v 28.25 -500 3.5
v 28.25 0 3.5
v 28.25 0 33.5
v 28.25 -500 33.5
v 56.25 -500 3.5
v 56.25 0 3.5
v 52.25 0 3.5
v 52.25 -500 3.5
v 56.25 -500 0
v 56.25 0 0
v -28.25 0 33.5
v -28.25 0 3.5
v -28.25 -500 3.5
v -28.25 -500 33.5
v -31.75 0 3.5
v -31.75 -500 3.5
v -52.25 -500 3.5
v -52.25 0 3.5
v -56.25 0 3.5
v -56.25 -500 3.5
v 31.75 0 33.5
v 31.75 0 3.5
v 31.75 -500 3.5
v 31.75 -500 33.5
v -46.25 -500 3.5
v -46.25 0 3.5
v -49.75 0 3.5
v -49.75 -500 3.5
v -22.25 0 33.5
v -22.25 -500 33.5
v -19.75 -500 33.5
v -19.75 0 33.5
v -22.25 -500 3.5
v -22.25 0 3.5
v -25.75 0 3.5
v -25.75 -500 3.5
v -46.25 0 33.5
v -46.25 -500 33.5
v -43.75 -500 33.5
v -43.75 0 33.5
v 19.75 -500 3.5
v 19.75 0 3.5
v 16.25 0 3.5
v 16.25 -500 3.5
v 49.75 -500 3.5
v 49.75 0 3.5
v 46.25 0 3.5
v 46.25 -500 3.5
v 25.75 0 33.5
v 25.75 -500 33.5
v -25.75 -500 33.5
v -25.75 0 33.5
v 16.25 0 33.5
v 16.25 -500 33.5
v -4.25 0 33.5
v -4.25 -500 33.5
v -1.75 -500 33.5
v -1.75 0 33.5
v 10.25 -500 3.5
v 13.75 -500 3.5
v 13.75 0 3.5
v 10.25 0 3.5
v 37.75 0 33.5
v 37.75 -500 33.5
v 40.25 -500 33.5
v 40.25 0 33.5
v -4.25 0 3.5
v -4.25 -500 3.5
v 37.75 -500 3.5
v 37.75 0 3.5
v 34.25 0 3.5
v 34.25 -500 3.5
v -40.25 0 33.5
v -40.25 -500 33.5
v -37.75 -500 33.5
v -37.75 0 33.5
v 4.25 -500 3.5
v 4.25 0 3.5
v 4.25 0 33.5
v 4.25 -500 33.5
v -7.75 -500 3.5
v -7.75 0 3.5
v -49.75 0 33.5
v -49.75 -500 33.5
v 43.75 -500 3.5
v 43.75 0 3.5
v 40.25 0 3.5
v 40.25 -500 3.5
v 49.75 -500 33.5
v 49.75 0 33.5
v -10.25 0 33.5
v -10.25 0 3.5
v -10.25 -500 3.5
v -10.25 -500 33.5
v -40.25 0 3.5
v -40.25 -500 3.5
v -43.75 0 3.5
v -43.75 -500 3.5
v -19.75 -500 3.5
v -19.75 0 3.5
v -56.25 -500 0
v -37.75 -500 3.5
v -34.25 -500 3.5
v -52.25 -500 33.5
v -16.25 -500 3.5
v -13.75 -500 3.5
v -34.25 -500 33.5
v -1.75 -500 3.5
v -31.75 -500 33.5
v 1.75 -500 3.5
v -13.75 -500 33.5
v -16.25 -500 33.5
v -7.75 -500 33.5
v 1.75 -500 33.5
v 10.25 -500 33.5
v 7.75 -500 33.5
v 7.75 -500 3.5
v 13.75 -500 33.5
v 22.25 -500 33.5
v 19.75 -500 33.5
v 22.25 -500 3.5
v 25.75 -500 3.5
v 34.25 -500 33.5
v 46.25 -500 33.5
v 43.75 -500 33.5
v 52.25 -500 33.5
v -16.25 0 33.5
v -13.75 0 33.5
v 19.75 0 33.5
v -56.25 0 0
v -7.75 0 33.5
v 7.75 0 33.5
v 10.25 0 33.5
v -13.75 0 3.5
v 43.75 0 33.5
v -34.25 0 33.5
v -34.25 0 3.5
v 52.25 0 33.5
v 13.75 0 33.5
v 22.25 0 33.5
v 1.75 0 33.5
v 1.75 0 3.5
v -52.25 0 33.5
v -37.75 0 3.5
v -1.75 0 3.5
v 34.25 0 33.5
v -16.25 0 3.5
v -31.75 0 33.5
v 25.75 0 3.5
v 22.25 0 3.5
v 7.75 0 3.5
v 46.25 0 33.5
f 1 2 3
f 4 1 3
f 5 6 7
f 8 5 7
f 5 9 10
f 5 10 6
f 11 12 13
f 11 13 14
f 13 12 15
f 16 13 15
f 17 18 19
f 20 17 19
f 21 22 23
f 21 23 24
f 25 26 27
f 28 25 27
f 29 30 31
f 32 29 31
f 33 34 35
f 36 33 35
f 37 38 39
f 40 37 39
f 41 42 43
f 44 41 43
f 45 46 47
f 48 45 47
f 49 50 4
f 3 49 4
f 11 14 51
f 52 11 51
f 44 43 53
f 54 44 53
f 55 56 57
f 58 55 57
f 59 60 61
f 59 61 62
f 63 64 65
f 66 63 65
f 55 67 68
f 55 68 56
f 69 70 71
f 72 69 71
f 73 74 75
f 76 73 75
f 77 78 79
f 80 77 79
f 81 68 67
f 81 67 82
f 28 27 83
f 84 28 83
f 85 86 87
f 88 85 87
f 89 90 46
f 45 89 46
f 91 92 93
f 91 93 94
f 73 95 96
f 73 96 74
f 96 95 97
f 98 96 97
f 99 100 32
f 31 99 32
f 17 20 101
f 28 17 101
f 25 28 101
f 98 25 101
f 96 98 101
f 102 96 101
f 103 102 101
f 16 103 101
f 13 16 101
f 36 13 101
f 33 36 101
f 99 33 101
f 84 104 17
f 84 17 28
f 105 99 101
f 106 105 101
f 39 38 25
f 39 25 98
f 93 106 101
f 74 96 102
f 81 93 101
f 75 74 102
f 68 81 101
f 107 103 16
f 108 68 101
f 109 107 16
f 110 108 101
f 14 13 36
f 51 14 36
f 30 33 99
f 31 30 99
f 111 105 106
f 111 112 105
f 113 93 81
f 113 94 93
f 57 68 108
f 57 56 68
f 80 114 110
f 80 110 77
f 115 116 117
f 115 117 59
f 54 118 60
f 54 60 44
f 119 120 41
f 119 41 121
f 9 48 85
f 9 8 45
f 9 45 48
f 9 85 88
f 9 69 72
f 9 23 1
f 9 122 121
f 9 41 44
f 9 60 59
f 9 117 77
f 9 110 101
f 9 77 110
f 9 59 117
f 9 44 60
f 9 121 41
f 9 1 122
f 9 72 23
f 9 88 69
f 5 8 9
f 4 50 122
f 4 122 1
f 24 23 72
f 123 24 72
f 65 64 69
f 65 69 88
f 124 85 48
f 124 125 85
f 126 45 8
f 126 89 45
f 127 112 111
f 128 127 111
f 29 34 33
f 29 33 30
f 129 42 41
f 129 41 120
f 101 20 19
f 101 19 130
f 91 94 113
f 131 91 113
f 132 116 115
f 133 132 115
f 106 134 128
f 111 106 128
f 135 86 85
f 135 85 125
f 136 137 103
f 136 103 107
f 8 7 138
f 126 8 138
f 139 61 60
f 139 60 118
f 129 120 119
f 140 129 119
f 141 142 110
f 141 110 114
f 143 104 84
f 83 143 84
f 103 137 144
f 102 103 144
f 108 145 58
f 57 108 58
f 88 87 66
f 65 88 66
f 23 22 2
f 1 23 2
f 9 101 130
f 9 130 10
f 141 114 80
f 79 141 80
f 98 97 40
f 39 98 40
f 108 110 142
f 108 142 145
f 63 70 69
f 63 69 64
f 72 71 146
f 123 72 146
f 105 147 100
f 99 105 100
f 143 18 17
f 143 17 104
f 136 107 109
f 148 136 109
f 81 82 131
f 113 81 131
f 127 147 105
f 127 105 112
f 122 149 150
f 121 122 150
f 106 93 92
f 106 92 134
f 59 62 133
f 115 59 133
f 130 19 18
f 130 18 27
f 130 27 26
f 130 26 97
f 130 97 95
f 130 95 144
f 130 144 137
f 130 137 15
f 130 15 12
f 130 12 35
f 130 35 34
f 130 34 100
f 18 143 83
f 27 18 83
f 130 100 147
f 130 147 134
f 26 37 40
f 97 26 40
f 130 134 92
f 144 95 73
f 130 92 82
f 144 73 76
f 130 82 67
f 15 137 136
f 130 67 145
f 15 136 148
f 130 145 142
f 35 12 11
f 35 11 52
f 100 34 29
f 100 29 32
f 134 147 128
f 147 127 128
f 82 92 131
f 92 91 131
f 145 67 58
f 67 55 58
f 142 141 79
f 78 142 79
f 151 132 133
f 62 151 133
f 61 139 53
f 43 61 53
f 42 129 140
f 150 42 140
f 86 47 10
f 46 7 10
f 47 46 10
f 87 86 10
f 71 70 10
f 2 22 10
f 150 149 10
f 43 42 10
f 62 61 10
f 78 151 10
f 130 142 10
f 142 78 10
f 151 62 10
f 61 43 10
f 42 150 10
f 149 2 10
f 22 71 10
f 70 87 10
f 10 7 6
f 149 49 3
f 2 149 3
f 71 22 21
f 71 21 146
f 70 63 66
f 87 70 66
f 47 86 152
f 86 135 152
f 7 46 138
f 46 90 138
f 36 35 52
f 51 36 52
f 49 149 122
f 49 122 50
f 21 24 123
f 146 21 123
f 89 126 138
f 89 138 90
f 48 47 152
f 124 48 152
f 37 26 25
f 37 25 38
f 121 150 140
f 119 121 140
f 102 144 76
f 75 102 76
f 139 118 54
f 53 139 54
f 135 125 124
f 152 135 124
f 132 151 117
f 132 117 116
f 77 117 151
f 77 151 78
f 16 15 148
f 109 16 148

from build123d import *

# Parameters (mm, degrees)
F0_W     = 2.5
F0_H     = 30
F1_DEPTH = 500


with BuildPart() as f1:
    # F0 (on Front) → F1 (new body)
    with BuildSketch(Plane.XZ):
        Polygon((-56.25, 0), (0, 0), (56.25, 0), (56.25, 3.5), (52.25, 3.5), (52.25, 33.5), (49.75, 33.5), (49.75, 3.5), (46.25, 3.5), (43.75, 3.5), (40.25, 3.5), (37.75, 3.5), (34.25, 3.5), (31.75, 3.5), (28.25, 3.5), (25.75, 3.5), (22.25, 3.5), (19.75, 3.5), (16.25, 3.5), (13.75, 3.5), (10.25, 3.5), (7.75, 3.5), (4.25, 3.5), (1.75, 3.5), (-1.75, 3.5), (-4.25, 3.5), (-7.75, 3.5), (-10.25, 3.5), (-13.75, 3.5), (-16.25, 3.5), (-19.75, 3.5), (-22.25, 3.5), (-25.75, 3.5), (-28.25, 3.5), (-31.75, 3.5), (-34.25, 3.5), (-37.75, 3.5), (-40.25, 3.5), (-43.75, 3.5), (-46.25, 3.5), (-49.75, 3.5), (-52.25, 3.5), (-56.25, 3.5), align=None)
        with Locations((-51, 18.5)):
            Rectangle(F0_W, F0_H)
        with Locations((-45, 18.5)):
            Rectangle(F0_W, F0_H)
        with Locations((45, 18.5)):
            Rectangle(F0_W, F0_H)
        with Locations((-39, 18.5)):
            Rectangle(F0_W, F0_H)
        with Locations((39, 18.5)):
            Rectangle(F0_W, F0_H)
        with Locations((-33, 18.5)):
            Rectangle(F0_W, F0_H)
        with Locations((33, 18.5)):
            Rectangle(F0_W, F0_H)
        with Locations((-27, 18.5)):
            Rectangle(F0_W, F0_H)
        with Locations((27, 18.5)):
            Rectangle(F0_W, F0_H)
        with Locations((-21, 18.5)):
            Rectangle(F0_W, F0_H)
        with Locations((21, 18.5)):
            Rectangle(F0_W, F0_H)
        with Locations((-15, 18.5)):
            Rectangle(F0_W, F0_H)
        with Locations((15, 18.5)):
            Rectangle(F0_W, F0_H)
        with Locations((-9, 18.5)):
            Rectangle(F0_W, F0_H)
        with Locations((9, 18.5)):
            Rectangle(F0_W, F0_H)
        with Locations((-3, 18.5)):
            Rectangle(F0_W, F0_H)
        with Locations((3, 18.5)):
            Rectangle(F0_W, F0_H)
    extrude(amount=F1_DEPTH)


solid = f1.part
